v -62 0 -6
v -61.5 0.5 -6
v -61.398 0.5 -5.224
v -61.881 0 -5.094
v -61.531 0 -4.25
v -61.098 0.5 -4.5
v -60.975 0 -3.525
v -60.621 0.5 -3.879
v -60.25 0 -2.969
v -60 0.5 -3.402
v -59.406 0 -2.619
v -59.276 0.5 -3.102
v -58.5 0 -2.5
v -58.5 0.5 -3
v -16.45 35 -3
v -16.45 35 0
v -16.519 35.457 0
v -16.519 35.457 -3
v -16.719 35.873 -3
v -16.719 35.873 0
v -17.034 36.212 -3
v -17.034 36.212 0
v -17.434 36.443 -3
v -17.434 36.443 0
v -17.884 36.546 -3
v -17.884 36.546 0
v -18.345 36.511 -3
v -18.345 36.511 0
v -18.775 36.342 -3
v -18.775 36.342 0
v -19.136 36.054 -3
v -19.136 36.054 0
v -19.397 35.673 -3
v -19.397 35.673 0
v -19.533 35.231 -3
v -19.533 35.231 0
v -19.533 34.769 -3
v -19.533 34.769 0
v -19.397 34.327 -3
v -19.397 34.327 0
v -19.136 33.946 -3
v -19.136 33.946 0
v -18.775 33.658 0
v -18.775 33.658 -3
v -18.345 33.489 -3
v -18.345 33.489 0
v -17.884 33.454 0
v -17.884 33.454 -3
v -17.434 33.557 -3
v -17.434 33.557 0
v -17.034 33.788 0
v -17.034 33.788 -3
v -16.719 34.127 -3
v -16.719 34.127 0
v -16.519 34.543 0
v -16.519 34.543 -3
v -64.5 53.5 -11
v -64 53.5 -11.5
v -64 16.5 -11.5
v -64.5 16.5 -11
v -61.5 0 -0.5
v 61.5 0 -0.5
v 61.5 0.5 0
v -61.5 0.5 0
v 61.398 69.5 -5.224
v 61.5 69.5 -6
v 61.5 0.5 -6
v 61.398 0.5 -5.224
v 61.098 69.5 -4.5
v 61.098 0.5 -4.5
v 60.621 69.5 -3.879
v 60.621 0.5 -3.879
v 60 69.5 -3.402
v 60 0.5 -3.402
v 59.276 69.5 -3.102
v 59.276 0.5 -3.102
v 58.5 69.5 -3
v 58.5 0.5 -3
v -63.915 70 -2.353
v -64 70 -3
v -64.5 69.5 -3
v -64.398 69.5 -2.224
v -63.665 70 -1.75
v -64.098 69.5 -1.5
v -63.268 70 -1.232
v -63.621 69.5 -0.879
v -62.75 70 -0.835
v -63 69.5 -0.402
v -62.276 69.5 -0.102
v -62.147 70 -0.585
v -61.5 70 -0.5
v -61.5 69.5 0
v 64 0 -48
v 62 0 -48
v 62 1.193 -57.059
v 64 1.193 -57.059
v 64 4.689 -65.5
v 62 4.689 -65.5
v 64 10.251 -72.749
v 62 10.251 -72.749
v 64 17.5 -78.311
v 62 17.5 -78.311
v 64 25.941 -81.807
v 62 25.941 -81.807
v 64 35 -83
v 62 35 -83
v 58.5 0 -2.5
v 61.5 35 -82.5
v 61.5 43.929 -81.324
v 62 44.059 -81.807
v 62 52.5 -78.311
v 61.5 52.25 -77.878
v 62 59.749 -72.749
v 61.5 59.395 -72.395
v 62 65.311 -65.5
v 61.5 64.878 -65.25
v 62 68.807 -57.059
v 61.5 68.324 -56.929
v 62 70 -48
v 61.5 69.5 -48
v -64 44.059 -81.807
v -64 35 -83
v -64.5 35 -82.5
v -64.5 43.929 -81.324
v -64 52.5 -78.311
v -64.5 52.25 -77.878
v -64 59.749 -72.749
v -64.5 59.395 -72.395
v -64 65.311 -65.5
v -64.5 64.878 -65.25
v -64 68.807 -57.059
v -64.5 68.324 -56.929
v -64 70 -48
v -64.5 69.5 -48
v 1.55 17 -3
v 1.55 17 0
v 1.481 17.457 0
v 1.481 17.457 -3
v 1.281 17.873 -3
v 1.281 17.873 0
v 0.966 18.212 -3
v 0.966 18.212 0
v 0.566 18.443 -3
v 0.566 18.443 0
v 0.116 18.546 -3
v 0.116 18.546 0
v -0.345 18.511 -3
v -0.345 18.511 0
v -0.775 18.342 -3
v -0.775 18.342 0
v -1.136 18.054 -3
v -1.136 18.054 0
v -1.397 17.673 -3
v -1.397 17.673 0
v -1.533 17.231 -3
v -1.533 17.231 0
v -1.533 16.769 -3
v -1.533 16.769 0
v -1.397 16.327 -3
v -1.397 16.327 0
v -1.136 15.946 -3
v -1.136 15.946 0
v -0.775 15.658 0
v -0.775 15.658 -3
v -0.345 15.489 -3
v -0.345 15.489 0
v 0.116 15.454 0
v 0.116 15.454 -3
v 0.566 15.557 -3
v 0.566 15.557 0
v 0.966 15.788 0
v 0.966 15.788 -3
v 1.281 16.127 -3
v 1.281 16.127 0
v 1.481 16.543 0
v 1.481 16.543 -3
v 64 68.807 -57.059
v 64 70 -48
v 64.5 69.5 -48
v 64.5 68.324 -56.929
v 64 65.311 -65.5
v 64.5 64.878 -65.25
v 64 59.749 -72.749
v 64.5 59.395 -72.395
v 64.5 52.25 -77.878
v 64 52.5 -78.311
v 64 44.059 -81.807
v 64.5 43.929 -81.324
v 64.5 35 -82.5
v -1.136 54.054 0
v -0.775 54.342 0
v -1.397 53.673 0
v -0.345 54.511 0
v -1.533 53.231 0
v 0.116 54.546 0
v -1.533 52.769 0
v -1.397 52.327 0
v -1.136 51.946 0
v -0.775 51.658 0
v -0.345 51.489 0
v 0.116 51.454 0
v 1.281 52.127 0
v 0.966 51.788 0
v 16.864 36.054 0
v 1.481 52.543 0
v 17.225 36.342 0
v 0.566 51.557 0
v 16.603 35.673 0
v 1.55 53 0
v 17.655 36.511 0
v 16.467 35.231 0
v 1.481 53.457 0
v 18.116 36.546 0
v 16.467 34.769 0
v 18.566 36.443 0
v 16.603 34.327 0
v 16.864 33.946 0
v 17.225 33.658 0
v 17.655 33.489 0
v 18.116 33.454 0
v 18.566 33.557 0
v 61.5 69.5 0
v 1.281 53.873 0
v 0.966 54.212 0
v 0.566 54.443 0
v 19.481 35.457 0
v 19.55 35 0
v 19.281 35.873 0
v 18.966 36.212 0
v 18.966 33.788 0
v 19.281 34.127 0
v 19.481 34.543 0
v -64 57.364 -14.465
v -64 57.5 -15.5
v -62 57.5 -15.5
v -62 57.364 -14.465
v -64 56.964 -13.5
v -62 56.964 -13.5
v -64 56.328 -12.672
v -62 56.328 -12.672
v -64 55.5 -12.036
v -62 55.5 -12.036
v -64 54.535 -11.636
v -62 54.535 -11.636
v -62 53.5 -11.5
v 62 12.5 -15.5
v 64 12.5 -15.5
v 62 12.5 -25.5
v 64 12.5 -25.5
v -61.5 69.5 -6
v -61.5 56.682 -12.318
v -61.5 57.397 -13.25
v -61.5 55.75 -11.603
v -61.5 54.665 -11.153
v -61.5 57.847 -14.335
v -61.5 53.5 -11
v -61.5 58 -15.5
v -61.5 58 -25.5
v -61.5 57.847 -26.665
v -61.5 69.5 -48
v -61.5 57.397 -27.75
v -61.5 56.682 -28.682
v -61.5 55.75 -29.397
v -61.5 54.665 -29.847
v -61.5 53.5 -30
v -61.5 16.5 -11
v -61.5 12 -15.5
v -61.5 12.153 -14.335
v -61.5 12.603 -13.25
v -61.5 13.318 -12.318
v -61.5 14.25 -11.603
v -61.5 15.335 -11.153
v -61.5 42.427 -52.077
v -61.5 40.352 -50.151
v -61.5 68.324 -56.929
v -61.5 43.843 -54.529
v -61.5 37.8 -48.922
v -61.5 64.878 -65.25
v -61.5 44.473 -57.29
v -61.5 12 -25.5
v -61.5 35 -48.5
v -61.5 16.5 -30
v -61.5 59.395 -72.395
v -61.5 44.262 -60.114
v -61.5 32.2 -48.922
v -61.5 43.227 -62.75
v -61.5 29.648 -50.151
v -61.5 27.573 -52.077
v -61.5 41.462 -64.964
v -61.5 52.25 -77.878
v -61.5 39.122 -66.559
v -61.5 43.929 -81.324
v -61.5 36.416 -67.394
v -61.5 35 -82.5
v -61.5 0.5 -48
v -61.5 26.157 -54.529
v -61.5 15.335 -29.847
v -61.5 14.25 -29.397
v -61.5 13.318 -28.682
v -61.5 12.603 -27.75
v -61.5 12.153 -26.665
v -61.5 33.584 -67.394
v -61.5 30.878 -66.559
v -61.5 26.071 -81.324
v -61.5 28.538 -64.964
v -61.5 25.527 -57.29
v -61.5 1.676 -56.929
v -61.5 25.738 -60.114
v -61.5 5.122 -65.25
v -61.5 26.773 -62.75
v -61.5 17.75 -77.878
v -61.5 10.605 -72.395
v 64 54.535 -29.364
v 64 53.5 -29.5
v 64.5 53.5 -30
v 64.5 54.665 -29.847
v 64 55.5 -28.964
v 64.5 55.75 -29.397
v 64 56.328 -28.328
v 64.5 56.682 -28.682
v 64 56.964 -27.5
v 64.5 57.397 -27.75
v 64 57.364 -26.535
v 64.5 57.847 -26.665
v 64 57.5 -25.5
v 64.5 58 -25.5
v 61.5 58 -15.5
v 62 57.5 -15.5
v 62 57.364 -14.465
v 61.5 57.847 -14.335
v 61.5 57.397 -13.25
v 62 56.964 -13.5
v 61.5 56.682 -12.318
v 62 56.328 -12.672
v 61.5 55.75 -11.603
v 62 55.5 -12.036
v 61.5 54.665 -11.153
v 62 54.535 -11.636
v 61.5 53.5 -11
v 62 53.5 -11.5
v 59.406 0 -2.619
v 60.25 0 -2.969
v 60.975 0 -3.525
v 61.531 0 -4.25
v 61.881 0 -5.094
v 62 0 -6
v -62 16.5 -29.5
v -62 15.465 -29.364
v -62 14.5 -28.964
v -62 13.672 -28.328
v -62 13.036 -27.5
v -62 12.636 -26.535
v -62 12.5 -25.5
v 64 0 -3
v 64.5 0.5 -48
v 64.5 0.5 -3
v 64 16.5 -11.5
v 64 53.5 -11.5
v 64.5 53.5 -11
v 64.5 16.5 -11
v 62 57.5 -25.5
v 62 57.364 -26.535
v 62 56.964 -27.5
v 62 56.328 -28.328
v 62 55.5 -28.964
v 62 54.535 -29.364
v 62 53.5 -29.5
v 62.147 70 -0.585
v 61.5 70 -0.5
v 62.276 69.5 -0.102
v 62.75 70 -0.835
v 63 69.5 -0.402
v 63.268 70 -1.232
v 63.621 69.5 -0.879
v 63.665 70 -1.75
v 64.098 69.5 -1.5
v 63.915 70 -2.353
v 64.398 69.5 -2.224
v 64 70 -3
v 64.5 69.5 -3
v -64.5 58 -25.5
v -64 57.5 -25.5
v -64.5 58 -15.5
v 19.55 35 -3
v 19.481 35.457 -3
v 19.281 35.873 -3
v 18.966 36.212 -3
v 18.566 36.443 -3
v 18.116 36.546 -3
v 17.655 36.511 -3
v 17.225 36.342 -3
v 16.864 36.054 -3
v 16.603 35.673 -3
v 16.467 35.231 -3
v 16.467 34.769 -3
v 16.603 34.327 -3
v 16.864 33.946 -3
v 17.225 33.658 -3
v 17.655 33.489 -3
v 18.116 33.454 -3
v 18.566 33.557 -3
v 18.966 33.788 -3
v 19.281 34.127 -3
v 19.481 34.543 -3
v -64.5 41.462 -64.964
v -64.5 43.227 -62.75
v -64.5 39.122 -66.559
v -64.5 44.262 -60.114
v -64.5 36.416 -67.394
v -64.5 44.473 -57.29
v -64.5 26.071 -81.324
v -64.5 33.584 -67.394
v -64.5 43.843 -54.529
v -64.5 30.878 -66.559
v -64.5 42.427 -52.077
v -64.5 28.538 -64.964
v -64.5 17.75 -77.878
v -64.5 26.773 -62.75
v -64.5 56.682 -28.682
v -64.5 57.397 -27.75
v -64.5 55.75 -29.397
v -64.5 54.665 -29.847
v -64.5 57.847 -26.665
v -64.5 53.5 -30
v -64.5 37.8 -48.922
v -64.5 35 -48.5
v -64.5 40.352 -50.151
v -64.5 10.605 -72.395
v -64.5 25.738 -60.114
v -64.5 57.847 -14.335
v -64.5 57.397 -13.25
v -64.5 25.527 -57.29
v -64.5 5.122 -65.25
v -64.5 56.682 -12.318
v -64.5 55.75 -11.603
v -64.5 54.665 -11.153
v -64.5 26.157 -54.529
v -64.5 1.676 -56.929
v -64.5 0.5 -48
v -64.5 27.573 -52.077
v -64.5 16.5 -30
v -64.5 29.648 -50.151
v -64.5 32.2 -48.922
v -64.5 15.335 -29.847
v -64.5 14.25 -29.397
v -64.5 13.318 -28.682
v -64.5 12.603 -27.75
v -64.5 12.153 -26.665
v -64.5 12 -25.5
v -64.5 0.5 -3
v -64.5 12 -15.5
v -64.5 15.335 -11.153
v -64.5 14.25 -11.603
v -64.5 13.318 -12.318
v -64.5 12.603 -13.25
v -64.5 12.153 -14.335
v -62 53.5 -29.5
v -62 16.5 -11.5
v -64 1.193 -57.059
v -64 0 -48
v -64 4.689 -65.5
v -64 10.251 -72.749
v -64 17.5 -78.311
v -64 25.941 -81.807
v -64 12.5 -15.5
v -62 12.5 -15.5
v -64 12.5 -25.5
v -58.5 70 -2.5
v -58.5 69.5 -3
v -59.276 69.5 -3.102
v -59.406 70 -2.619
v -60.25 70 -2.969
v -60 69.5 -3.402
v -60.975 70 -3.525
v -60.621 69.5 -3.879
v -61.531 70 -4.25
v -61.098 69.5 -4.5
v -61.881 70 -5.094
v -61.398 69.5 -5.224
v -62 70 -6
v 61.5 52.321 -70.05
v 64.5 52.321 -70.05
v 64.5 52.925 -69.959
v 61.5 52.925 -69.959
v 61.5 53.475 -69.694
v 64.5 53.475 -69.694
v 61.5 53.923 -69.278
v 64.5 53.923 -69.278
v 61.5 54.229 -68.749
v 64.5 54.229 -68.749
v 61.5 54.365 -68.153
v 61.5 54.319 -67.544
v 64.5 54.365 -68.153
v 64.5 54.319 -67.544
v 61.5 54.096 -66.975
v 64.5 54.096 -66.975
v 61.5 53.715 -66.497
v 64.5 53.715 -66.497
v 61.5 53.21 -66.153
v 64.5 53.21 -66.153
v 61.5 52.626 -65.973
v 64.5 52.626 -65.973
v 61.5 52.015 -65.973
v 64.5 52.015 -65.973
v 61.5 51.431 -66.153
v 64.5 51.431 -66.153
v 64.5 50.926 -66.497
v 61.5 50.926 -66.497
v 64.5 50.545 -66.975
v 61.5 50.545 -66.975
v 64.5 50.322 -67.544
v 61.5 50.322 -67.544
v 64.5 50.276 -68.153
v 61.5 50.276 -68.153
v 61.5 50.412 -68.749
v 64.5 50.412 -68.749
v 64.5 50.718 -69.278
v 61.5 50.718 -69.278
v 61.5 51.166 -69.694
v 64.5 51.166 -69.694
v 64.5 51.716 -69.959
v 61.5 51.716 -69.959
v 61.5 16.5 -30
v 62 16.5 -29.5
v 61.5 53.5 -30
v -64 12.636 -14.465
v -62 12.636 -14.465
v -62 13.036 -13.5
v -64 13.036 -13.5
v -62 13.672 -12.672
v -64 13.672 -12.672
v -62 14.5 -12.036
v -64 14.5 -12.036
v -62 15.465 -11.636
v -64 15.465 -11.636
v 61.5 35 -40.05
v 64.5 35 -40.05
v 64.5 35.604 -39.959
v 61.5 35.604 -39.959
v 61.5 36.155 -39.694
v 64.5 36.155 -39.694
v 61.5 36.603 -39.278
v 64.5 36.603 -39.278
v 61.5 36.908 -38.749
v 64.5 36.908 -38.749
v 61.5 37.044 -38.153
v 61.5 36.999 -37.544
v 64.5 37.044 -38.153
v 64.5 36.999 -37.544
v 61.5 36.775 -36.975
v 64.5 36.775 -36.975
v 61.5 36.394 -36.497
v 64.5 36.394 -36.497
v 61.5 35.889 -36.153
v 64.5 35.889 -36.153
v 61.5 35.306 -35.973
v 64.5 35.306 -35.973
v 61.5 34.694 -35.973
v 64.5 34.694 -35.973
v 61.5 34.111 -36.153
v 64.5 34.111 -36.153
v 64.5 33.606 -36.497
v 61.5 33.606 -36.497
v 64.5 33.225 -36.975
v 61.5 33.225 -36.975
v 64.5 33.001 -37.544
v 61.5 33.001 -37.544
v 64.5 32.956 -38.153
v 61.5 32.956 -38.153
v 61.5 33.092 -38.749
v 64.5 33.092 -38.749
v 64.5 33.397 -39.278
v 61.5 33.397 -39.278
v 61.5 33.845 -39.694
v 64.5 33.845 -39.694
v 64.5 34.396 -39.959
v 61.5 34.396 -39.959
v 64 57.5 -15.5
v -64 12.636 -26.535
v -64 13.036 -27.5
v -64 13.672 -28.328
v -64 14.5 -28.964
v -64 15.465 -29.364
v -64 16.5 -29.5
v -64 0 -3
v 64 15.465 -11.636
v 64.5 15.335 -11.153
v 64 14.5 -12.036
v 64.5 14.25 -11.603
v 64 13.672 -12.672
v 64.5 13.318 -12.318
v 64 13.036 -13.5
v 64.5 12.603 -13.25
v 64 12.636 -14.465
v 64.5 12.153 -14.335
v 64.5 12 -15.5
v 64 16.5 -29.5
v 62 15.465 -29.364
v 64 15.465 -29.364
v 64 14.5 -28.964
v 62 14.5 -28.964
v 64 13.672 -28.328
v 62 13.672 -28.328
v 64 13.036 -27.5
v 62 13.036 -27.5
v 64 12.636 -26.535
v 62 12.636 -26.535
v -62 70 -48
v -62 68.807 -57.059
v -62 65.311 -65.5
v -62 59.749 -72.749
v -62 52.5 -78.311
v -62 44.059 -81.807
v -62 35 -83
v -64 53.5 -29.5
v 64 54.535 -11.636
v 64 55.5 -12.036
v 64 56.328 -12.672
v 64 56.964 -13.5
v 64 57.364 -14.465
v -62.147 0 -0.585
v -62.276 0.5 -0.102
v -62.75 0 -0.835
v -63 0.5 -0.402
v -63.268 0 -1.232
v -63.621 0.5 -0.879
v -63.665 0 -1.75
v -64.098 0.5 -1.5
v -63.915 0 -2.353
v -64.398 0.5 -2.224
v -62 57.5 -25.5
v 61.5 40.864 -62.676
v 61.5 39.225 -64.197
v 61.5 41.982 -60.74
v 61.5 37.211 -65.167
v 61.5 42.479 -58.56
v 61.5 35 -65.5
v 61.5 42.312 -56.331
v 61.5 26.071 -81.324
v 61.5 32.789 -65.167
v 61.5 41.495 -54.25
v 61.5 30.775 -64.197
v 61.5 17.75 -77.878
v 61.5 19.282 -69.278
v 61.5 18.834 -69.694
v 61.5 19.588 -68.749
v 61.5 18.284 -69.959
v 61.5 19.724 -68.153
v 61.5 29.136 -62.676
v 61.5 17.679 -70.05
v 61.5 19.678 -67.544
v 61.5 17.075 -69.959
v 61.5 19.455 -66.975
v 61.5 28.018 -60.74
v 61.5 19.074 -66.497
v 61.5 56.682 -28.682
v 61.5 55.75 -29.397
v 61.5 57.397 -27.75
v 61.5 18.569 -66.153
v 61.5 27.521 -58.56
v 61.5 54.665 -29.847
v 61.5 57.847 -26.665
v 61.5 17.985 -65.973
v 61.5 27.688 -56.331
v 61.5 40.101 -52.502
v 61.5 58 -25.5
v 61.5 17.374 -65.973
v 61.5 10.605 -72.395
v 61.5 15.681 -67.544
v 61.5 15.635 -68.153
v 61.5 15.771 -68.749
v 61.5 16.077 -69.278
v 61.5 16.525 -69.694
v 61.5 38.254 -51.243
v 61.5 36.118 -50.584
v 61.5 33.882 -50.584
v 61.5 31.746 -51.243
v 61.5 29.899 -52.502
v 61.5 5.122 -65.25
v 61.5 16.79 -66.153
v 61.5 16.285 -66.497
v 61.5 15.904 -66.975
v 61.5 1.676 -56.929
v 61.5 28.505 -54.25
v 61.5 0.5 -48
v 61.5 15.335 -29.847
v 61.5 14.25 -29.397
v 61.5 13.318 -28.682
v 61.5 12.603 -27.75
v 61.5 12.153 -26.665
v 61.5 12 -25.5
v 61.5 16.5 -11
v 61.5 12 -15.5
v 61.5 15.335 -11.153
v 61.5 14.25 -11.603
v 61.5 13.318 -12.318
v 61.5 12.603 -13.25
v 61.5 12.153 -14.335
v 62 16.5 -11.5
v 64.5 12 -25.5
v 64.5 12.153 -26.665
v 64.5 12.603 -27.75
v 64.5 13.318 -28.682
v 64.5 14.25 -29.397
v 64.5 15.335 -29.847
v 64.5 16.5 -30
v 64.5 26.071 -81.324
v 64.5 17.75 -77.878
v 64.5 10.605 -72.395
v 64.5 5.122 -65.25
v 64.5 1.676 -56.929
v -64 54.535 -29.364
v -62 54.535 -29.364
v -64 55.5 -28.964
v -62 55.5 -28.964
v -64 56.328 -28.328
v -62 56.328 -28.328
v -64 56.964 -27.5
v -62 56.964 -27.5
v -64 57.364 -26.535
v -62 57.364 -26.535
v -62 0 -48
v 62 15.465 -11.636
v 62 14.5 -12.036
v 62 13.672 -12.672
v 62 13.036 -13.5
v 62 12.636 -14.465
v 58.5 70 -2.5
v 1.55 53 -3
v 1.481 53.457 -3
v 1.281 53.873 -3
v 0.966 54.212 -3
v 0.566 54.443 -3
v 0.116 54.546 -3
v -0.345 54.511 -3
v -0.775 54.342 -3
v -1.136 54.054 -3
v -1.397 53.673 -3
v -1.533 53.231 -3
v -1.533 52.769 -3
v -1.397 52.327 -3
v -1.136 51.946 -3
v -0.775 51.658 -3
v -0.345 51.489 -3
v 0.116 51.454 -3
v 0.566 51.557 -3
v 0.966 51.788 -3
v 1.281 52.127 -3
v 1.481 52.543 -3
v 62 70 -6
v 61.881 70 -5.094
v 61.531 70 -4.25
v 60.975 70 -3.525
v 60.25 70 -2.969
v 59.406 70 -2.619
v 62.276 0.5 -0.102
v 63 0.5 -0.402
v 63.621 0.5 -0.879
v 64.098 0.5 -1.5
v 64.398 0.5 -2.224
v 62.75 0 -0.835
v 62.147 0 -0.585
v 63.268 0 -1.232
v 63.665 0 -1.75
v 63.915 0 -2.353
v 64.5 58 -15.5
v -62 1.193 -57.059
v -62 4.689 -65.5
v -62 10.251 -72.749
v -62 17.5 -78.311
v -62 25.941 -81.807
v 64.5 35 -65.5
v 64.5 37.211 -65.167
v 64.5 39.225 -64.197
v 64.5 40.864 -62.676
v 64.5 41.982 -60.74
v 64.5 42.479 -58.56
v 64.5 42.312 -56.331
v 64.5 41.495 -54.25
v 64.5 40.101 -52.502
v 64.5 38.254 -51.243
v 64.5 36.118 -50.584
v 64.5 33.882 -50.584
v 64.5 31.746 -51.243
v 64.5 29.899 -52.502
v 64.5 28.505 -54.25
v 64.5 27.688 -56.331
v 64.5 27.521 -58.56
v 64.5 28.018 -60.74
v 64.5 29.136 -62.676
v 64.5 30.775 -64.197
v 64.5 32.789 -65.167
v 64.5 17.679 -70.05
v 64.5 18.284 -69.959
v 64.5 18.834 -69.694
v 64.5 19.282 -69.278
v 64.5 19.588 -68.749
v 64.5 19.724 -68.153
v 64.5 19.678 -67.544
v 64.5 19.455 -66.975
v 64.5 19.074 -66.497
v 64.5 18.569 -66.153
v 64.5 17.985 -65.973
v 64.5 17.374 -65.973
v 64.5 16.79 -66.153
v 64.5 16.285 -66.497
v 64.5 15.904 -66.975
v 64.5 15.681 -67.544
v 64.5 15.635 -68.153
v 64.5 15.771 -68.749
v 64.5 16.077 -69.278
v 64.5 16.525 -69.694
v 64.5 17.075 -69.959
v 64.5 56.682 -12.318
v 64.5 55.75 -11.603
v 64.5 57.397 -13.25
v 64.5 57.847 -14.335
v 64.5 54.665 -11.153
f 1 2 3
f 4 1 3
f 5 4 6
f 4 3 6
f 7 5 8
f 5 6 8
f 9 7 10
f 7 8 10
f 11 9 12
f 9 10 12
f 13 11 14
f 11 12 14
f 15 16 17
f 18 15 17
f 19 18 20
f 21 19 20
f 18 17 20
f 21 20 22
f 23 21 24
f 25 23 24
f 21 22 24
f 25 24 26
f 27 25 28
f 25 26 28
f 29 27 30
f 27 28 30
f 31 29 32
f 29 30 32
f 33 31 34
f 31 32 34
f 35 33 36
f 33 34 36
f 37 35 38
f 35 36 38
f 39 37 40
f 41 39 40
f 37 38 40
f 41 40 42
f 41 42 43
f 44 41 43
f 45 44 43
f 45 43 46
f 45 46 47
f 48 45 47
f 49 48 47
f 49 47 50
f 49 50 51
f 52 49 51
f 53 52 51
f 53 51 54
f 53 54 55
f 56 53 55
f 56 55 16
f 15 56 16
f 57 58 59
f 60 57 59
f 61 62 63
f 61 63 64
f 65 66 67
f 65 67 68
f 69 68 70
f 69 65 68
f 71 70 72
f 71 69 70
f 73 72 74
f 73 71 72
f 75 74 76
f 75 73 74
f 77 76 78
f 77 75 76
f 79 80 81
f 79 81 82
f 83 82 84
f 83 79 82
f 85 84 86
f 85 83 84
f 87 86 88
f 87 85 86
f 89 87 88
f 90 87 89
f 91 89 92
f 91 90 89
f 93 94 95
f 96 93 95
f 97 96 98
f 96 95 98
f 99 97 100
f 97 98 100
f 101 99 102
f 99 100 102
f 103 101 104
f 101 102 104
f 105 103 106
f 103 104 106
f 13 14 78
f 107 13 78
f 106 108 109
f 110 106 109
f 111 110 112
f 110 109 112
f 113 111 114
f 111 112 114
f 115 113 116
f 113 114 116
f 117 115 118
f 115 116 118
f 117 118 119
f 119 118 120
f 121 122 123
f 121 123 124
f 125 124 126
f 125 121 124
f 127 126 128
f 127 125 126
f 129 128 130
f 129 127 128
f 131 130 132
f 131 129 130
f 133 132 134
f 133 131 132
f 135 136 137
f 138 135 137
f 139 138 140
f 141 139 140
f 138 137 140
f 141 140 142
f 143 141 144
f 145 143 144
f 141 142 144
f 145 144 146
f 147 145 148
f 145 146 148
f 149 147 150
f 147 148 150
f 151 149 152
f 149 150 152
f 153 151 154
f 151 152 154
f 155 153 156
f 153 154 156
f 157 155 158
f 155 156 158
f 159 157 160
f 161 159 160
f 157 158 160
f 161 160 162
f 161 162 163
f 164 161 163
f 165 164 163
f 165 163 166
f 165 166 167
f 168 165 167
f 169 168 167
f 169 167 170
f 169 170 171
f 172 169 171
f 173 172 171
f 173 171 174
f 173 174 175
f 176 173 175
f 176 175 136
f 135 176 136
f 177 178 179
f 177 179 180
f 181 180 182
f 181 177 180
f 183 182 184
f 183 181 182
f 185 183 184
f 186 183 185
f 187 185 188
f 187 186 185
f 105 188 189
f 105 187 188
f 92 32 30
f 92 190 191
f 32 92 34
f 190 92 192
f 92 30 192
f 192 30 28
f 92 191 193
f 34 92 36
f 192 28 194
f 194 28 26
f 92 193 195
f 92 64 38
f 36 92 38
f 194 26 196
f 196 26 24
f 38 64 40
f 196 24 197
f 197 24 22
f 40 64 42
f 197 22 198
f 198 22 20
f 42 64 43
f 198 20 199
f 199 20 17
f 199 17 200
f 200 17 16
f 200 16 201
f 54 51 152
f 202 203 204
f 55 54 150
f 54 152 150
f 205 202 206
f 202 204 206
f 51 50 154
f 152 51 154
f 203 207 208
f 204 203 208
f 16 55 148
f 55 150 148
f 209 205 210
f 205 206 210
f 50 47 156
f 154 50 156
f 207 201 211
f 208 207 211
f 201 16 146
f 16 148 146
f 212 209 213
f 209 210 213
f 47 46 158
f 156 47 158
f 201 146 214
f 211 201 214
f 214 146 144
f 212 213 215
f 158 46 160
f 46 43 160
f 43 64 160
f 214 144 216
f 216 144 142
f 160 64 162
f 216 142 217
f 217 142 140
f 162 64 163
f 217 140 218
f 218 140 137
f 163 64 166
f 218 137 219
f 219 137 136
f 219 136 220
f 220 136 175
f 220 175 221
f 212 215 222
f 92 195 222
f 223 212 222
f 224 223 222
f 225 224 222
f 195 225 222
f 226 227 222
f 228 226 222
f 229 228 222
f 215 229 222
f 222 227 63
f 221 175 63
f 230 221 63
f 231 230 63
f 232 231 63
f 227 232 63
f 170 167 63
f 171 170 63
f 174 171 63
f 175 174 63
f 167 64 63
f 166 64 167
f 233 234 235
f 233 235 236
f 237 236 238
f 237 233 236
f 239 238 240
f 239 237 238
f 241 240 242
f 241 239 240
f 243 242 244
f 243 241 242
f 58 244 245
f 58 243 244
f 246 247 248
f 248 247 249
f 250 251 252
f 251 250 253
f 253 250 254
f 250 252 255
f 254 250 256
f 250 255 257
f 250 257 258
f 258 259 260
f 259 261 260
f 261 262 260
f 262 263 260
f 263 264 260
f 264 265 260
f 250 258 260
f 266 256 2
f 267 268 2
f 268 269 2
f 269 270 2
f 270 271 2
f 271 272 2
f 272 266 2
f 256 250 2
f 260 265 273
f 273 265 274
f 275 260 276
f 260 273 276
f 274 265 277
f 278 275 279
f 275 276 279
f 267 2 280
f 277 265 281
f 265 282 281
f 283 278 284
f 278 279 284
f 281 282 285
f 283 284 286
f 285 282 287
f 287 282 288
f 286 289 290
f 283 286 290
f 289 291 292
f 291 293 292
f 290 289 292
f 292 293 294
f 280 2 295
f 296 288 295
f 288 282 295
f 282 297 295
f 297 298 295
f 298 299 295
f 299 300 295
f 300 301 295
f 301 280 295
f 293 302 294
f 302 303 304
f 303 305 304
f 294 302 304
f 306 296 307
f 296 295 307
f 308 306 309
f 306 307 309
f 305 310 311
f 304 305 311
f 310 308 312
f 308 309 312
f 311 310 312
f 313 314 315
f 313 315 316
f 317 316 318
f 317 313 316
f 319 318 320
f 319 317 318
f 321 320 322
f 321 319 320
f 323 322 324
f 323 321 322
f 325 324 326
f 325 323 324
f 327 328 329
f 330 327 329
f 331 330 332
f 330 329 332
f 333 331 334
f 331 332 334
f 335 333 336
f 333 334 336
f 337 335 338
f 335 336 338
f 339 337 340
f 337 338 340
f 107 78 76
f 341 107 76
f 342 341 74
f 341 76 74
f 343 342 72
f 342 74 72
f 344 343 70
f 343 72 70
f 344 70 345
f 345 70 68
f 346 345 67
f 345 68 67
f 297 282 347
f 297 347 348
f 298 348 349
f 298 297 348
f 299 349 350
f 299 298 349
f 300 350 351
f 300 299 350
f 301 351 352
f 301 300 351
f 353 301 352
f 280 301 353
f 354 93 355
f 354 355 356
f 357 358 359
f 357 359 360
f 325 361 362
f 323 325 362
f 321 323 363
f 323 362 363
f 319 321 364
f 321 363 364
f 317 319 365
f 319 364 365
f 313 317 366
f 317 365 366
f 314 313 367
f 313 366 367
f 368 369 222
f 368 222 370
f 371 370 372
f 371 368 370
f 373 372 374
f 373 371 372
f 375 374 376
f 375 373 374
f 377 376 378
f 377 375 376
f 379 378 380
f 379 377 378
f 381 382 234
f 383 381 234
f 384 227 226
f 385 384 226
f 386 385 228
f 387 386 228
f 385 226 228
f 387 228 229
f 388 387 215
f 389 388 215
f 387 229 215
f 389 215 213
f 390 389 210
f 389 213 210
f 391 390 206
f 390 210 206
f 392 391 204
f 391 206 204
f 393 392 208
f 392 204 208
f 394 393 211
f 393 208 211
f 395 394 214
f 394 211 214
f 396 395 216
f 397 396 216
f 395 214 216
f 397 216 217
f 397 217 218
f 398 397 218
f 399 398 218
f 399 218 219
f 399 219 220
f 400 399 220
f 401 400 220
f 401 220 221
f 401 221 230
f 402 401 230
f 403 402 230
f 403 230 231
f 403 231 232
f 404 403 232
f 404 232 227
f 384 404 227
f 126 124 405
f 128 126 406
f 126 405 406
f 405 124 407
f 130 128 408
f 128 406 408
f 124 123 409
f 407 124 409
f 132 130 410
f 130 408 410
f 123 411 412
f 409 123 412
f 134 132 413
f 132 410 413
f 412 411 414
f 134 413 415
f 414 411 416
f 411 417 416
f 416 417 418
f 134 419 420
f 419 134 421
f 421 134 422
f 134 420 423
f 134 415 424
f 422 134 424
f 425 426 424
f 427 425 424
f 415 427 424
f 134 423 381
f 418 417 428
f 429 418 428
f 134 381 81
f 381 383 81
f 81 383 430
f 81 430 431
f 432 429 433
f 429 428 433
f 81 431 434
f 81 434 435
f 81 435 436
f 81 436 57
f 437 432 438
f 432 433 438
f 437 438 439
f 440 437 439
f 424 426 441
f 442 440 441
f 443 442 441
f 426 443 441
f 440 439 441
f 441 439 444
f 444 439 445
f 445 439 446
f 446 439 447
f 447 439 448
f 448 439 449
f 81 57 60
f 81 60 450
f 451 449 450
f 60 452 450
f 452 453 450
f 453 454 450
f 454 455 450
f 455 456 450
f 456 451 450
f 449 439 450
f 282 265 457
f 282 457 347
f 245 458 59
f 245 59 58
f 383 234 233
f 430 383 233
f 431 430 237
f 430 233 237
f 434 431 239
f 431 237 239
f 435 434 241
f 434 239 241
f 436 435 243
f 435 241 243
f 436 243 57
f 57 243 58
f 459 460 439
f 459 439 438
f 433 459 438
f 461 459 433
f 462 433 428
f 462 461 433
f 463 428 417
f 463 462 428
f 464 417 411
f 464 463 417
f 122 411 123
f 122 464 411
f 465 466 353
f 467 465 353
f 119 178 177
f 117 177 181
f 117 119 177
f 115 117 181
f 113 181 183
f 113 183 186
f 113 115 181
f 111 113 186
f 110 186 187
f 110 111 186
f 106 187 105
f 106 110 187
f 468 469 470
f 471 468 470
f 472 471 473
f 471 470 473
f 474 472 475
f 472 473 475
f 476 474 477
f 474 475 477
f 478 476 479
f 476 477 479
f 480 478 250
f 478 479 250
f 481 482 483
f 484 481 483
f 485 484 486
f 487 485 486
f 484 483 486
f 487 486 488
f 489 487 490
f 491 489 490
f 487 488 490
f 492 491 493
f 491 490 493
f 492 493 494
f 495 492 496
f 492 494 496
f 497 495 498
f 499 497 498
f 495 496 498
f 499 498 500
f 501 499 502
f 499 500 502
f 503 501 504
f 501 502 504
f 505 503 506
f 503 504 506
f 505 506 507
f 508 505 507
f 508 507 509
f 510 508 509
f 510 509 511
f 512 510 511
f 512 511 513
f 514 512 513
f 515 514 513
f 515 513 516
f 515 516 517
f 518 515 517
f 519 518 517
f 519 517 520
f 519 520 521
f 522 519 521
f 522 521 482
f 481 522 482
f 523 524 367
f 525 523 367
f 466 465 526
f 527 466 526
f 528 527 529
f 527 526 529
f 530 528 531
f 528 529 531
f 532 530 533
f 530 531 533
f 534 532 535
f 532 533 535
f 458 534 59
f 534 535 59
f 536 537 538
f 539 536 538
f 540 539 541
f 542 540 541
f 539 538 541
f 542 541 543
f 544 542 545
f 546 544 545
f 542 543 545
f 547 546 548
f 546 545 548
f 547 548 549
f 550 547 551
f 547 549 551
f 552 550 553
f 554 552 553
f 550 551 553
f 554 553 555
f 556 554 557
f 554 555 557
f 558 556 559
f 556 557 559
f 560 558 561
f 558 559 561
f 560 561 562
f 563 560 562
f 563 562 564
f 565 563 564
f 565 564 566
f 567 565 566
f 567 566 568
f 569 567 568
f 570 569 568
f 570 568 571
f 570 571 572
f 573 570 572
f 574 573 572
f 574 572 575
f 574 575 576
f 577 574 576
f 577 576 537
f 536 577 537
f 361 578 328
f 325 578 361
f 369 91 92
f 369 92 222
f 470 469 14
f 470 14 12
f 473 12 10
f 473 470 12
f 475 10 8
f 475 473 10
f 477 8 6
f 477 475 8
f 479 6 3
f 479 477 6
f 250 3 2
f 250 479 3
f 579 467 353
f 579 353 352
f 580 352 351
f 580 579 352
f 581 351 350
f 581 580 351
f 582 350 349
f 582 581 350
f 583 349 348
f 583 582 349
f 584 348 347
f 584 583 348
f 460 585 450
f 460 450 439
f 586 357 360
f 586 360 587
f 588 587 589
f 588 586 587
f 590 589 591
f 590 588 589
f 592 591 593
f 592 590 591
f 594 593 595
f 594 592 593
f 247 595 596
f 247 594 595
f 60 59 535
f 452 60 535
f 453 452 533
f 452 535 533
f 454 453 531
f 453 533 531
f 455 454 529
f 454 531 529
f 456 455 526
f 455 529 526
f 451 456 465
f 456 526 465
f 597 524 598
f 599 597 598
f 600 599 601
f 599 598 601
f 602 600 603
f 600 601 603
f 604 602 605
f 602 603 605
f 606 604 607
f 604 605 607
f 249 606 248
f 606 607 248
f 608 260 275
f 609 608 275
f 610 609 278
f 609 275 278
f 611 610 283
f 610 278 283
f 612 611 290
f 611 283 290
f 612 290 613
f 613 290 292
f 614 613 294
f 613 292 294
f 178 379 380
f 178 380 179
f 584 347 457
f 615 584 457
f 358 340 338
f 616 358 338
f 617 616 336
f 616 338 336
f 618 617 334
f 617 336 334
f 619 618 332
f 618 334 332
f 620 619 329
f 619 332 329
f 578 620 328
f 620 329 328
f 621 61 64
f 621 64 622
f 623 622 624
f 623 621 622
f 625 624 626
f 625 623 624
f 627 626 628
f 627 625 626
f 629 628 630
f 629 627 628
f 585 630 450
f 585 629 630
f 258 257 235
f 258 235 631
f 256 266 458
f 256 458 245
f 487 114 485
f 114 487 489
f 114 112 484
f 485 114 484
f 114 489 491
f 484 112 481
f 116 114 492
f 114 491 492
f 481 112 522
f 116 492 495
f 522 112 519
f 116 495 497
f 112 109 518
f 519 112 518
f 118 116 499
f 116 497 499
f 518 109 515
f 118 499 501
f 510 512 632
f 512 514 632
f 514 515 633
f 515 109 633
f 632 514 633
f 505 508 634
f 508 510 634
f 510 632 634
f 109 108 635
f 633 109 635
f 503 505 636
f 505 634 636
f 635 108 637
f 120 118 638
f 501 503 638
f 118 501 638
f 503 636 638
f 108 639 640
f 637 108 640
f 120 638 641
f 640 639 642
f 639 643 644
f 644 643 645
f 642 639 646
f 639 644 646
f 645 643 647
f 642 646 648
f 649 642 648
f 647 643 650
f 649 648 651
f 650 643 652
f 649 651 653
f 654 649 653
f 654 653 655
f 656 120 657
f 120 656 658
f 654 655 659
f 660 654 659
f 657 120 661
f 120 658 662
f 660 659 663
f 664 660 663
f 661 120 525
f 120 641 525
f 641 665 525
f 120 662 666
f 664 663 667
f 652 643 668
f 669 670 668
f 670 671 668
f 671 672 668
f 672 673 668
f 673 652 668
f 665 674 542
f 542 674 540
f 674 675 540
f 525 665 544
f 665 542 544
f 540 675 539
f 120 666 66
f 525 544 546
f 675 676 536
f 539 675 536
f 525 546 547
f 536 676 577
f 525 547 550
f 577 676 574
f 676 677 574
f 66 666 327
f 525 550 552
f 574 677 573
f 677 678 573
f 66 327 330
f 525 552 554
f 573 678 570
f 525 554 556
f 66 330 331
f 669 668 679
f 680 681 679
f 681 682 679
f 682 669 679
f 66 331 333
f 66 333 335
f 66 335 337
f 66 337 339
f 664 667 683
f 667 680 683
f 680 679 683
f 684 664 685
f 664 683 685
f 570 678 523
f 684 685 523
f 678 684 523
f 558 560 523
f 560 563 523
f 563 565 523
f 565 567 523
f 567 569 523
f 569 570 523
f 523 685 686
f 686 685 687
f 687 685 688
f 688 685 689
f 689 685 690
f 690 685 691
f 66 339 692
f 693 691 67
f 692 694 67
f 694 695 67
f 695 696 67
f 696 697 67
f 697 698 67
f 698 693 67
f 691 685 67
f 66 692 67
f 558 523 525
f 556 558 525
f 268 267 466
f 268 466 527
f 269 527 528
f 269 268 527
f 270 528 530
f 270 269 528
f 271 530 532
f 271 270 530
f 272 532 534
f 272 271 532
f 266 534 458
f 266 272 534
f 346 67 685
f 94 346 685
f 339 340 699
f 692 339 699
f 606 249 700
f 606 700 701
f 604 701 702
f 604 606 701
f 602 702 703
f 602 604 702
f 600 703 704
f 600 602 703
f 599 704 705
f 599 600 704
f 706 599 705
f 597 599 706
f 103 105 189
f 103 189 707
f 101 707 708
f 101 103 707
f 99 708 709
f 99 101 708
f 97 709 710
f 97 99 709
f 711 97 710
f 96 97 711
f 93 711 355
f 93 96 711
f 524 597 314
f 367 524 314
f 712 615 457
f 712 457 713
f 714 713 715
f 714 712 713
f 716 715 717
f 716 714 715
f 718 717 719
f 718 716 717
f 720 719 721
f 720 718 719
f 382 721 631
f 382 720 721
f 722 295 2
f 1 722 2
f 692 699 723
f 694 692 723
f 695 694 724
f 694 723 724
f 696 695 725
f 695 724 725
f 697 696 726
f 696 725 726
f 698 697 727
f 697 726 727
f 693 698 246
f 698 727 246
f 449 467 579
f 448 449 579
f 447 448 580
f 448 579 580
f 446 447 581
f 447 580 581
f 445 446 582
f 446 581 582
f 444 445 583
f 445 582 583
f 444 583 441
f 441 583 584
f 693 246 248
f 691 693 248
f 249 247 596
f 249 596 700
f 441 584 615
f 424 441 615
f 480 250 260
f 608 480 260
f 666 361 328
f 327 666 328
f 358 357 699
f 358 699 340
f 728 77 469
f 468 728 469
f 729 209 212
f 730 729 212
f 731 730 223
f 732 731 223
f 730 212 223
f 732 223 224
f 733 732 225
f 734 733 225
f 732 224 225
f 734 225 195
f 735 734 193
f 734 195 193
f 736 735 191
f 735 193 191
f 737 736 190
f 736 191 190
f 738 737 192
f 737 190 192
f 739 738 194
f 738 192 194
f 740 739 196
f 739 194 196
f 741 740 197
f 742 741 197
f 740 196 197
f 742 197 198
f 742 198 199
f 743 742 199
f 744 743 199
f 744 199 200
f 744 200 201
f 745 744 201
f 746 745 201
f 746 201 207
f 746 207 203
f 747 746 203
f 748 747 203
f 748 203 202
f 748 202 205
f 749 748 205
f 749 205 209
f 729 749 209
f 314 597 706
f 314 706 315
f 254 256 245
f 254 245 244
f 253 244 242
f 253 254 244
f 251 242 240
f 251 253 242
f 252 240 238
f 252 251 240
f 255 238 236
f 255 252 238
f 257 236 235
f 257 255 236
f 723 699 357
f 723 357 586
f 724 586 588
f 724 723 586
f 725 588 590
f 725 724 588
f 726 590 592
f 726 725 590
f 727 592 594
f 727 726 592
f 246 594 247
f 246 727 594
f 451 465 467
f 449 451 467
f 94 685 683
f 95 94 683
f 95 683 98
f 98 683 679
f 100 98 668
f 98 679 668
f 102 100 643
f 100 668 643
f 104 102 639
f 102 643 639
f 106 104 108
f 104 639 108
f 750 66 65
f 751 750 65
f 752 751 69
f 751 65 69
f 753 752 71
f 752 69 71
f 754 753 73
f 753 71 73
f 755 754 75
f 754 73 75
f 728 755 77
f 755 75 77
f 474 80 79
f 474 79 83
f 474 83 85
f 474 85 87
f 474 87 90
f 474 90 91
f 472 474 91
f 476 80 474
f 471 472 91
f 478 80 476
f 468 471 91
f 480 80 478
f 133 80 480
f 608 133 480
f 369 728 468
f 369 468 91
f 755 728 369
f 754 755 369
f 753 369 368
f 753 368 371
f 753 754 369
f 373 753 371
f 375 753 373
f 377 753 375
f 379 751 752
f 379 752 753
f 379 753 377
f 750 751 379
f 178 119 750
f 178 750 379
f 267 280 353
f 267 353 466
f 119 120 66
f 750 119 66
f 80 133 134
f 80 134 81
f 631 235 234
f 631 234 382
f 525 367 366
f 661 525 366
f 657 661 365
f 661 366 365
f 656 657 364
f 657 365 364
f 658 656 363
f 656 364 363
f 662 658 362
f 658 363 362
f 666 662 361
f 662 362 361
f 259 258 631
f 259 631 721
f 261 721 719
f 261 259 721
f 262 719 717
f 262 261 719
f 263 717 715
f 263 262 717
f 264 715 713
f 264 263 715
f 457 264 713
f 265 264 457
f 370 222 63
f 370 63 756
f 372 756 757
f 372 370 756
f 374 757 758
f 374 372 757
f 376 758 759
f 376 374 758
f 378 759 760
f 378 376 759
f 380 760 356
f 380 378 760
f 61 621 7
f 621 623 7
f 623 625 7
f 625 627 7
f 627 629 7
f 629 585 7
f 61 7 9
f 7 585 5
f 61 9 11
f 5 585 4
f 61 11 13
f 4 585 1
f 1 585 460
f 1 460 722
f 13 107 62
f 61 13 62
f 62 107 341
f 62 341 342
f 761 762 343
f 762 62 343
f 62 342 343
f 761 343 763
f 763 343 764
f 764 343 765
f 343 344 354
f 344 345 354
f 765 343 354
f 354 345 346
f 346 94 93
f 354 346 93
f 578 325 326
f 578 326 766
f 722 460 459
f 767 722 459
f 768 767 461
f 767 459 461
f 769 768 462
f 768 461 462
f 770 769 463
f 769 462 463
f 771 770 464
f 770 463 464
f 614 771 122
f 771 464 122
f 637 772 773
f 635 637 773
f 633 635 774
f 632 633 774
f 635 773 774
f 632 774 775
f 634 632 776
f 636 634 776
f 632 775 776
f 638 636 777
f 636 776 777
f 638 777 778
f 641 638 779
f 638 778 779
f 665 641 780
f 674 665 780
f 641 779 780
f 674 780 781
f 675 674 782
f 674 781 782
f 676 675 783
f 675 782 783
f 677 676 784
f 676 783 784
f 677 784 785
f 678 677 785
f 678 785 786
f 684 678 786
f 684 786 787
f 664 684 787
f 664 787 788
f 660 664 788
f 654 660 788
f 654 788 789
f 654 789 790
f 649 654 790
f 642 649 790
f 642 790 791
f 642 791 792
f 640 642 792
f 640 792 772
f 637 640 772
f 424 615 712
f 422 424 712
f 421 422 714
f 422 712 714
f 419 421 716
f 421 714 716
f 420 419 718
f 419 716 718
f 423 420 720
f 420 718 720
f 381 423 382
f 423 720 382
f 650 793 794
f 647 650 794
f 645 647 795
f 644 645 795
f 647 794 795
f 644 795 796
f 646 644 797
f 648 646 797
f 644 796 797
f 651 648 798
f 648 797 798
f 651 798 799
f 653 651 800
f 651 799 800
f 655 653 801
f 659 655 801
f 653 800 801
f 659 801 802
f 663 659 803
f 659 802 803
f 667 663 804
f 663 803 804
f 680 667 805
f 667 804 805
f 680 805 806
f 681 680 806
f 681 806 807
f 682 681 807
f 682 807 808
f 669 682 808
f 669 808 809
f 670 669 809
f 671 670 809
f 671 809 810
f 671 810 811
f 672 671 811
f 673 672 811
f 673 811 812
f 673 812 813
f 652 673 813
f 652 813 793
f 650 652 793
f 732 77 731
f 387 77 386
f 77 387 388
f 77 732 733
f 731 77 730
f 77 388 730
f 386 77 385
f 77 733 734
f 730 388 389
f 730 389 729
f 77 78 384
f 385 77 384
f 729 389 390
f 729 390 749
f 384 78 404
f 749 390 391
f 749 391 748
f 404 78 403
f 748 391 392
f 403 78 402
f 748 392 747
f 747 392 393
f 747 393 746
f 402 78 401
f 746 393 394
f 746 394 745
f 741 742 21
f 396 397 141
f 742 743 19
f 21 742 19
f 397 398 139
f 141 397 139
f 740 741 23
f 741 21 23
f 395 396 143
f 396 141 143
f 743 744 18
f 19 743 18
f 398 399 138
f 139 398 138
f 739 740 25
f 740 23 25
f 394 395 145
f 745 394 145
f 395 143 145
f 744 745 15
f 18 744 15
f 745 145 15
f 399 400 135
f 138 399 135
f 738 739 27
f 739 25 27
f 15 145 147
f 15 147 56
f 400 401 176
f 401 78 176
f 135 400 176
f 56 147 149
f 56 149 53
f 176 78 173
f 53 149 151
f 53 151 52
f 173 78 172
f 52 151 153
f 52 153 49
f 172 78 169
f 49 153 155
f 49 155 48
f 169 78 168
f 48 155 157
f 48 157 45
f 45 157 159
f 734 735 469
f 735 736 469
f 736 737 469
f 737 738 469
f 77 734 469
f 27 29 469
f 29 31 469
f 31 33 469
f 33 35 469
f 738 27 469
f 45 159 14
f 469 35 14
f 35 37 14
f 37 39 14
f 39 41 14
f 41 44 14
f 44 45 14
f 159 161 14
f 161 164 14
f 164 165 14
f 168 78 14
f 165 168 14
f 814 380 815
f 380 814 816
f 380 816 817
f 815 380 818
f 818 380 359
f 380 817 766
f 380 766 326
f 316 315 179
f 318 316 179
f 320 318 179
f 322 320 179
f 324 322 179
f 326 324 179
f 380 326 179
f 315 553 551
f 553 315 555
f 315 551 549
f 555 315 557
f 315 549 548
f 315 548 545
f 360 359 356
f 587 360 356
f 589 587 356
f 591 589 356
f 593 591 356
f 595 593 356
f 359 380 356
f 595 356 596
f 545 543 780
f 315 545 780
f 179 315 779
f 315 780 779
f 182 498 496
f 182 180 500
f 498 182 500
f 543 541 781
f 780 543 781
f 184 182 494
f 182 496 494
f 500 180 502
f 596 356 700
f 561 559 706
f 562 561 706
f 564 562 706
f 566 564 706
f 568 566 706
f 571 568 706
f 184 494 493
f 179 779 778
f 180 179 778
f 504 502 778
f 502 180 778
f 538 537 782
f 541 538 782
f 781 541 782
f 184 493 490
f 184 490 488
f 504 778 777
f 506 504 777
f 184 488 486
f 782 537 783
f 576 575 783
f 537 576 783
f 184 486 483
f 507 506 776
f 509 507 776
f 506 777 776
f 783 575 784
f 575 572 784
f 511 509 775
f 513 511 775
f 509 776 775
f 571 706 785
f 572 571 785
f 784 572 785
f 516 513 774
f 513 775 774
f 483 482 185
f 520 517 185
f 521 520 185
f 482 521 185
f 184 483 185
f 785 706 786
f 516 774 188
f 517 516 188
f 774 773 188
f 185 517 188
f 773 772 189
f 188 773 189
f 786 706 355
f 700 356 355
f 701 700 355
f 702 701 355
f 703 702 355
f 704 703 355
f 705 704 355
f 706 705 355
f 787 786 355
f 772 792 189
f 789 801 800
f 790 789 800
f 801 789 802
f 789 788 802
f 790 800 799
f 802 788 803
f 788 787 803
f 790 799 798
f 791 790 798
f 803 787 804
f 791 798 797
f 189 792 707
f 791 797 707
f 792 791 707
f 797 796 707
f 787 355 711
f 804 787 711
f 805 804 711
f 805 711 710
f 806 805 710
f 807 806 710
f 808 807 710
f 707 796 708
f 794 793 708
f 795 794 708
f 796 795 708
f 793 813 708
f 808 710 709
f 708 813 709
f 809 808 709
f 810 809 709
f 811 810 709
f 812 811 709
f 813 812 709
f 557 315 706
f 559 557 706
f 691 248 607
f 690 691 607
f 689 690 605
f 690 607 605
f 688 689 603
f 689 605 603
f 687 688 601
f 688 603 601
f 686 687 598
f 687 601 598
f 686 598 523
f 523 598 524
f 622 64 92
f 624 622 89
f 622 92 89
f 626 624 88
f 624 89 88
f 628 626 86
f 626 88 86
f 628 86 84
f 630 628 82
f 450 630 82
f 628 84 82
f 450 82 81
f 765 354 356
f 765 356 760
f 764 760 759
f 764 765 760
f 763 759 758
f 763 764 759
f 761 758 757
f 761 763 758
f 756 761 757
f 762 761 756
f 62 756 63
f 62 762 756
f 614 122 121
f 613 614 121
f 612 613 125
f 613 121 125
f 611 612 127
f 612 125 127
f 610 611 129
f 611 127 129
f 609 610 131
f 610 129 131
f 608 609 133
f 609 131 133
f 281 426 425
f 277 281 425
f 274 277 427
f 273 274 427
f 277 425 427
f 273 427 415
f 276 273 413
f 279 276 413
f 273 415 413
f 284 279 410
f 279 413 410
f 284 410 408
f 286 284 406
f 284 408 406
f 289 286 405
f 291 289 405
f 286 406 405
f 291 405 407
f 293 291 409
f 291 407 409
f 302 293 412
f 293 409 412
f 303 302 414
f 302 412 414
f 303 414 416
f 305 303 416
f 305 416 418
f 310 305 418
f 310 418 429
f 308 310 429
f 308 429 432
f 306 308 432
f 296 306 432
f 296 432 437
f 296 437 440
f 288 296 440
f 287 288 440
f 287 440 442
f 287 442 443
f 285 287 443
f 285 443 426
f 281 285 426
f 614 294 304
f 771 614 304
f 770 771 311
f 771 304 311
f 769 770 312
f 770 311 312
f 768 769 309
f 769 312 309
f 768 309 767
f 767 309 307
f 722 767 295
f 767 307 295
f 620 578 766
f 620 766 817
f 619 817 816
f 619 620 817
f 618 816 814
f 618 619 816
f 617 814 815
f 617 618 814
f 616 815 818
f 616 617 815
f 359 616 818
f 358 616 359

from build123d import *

# Parameters (mm, degrees)
F_70MM_DEPTH            = 70
FILLET_1_R              = 3
CUT_EXTRUDE_1_REACH     = 170.612
SKETCH_2_R              = 2.05
SKETCH_2_R_2            = 7.5
CUT_EXTRUDE_2_REACH     = 170.612
SKETCH_3_R              = 9.5
SKETCH_4_W              = 18
SKETCH_4_H              = 45
CUT_EXTRUDE_3_DEPTH     = 169.611980594
FILLET_2_R              = 4
FILLET_3_R              = 35
HOLE_WIZARD_3_1_3_1_1_D = 3.1
CHAMFER_1_SIZE          = 0.5


with BuildPart() as part:
    # 草图1 → 宽70mm (new body)
    with BuildSketch(Plane(origin=(0, 0, 0), x_dir=(1, 0, 0), z_dir=(0, 1, 0))):
        Polygon((-64.5, 0), (64.5, 0), (64.5, 83), (61.5, 83), (61.5, 3), (-61.5, 3), (-61.5, 83), (-64.5, 83), align=None)
    extrude(amount=F_70MM_DEPTH)

    # 圆角1
    fillet_1_edges = [part.edges().sort_by_distance(p)[0] for p in [
        (64.5, 35, 0),
        (-64.5, 35, 0),
        (-61.5, 35, -3),
        (61.5, 35, -3),
    ]]
    fillet(fillet_1_edges, radius=FILLET_1_R)

    # 草图2 → 切除-拉伸1 (cut, up to next)
    with BuildSketch(Plane(origin=(64.5, 0, 0), x_dir=(0, 0, -1), z_dir=(1, 0, 0)), mode=Mode.PRIVATE) as cut_extrude_1_sk1:
        with Locations((38, 35)):
            Circle(SKETCH_2_R)
    cut_extrude_1_tool1 = extrude(cut_extrude_1_sk1.sketch, amount=-CUT_EXTRUDE_1_REACH, mode=Mode.PRIVATE) & part.part
    # 草图2 → 切除-拉伸1 (cut, up to next)
    with BuildSketch(Plane(origin=(64.5, 0, 0), x_dir=(0, 0, -1), z_dir=(1, 0, 0)), mode=Mode.PRIVATE) as cut_extrude_1_sk2:
        with Locations((68, 52.320508076)):
            Circle(SKETCH_2_R)
    cut_extrude_1_tool2 = extrude(cut_extrude_1_sk2.sketch, amount=-CUT_EXTRUDE_1_REACH, mode=Mode.PRIVATE) & part.part
    # 草图2 → 切除-拉伸1 (cut, up to next)
    with BuildSketch(Plane(origin=(64.5, 0, 0), x_dir=(0, 0, -1), z_dir=(1, 0, 0)), mode=Mode.PRIVATE) as cut_extrude_1_sk3:
        with Locations((68, 17.679491924)):
            Circle(SKETCH_2_R)
    cut_extrude_1_tool3 = extrude(cut_extrude_1_sk3.sketch, amount=-CUT_EXTRUDE_1_REACH, mode=Mode.PRIVATE) & part.part
    # 草图2 → 切除-拉伸1 (cut, up to next)
    with BuildSketch(Plane(origin=(64.5, 0, 0), x_dir=(0, 0, -1), z_dir=(1, 0, 0)), mode=Mode.PRIVATE) as cut_extrude_1_sk4:
        with Locations((58, 35)):
            Circle(SKETCH_2_R_2)
    cut_extrude_1_tool4 = extrude(cut_extrude_1_sk4.sketch, amount=-CUT_EXTRUDE_1_REACH, mode=Mode.PRIVATE) & part.part
    add(cut_extrude_1_tool1.solids().sort_by_distance((64.5, 35, -38))[0], mode=Mode.SUBTRACT)
    add(cut_extrude_1_tool2.solids().sort_by_distance((64.5, 52.320508, -68))[0], mode=Mode.SUBTRACT)
    add(cut_extrude_1_tool3.solids().sort_by_distance((64.5, 17.679492, -68))[0], mode=Mode.SUBTRACT)
    add(cut_extrude_1_tool4.solids().sort_by_distance((64.5, 35, -58))[0], mode=Mode.SUBTRACT)

    # 草图3 → 切除-拉伸2 (cut, up to next)
    with BuildSketch(Plane.ZY.offset(64.5), mode=Mode.PRIVATE) as cut_extrude_2_sk1:
        with Locations((-58, 35)):
            Circle(SKETCH_3_R)
    cut_extrude_2_tool1 = extrude(cut_extrude_2_sk1.sketch, amount=-CUT_EXTRUDE_2_REACH, mode=Mode.PRIVATE) & part.part
    add(cut_extrude_2_tool1.solids().sort_by_distance((-64.5, 35, -58))[0], mode=Mode.SUBTRACT)

    # 草图4 → 切除-拉伸3 (cut, through all)
    with BuildSketch(Plane(origin=(64.5, 0, 0), x_dir=(0, 0, -1), z_dir=(1, 0, 0))):
        with Locations((20.5, 35)):
            Rectangle(SKETCH_4_W, SKETCH_4_H)
    extrude(amount=-CUT_EXTRUDE_3_DEPTH, mode=Mode.SUBTRACT)

    # 圆角2
    fillet_2_edges = [part.edges().sort_by_distance(p)[0] for p in [
        (63, 57.5, -29.5),
        (-63, 57.5, -29.5),
        (63, 12.5, -29.5),
        (-63, 12.5, -29.5),
        (63, 12.5, -11.5),
        (-63, 12.5, -11.5),
        (63, 57.5, -11.5),
        (-63, 57.5, -11.5),
    ]]
    fillet(fillet_2_edges, radius=FILLET_2_R)

    # 圆角3
    fillet_3_edges = [part.edges().sort_by_distance(p)[0] for p in [
        (63, 70, -83),
        (-63, 70, -83),
        (-63, 0, -83),
        (63, 0, -83),
    ]]
    fillet(fillet_3_edges, radius=FILLET_3_R - 0.0001)  # a hair under: the kernel refuses the full size

    # Ø3.1 (3.1) 直径孔1 (through all)
    with Locations(Plane(origin=(0, 53, -3), x_dir=(-1, 0, 0), z_dir=(0, 0, -1))):
        with Locations((0, 0), (-18, -18), (0, -36), (18, -18)):
            Hole(HOLE_WIZARD_3_1_3_1_1_D / 2)

    # 倒角1
    chamfer_1_edges = [part.edges().sort_by_distance(p)[0] for p in [
        (-64.5, 35, -29.5),
        (-61.5, 35, -29.5),
        (-64.5, 35, -11.5),
        (-61.5, 35, -11.5),
        (-64.5, 12.5, -20.5),
        (-61.5, 12.5, -20.5),
        (64.5, 35, -29.5),
        (61.5, 35, -29.5),
        (64.5, 12.5, -20.5),
        (61.5, 12.5, -20.5),
        (64.5, 57.5, -20.5),
        (61.5, 57.5, -20.5),
        (64.5, 35, -11.5),
        (61.5, 35, -11.5),
        (-61.5, 56.328427125, -28.328427125),
        (-64.5, 56.328427125, -28.328427125),
        (-61.5, 56.328427125, -12.671572875),
        (-64.5, 56.328427125, -12.671572875),
        (-61.5, 13.671572875, -28.328427125),
        (-64.5, 13.671572875, -28.328427125),
        (-61.5, 13.671572875, -12.671572875),
        (-64.5, 13.671572875, -12.671572875),
        (64.5, 13.671572875, -28.328427125),
        (61.5, 13.671572875, -28.328427125),
        (64.5, 56.328427125, -28.328427125),
        (61.5, 56.328427125, -28.328427125),
        (64.5, 13.671572875, -12.671572875),
        (61.5, 13.671572875, -12.671572875),
        (64.5, 56.328427125, -12.671572875),
        (61.5, 56.328427125, -12.671572875),
        (61.5, 70, -27.00005),
        (-64.5, 70, -25.50005),
        (61.5, 0, -27.00005),
        (61.5, 10.251233369, -72.748766631),
        (61.5, 59.748766631, -72.748766631),
        (64.5, 10.251233369, -72.748766631),
        (64.5, 59.748766631, -72.748766631),
        (-64.5, 0, -25.50005),
        (-64.5, 10.251233369, -72.748766631),
        (-64.5, 59.748766631, -72.748766631),
        (-61.5, 10.251233369, -72.748766631),
        (-61.5, 59.748766631, -72.748766631),
        (64.5, 0, -25.50005),
        (64.5, 70, -25.50005),
        (0, 0, 0),
        (-61.5, 0, -27.00005),
        (0, 0, -3),
        (-63.621320344, 0, -0.878679656),
        (63.621320344, 0, -0.878679656),
        (0, 70, 0),
        (0, 70, -3),
        (-61.5, 70, -27.00005),
        (-63.621320344, 70, -0.878679656),
        (63.621320344, 70, -0.878679656),
        (-60.621320344, 0, -3.878679656),
        (-60.621320344, 70, -3.878679656),
        (60.621320344, 0, -3.878679656),
        (60.621320344, 70, -3.878679656),
        (-64.5, 57.5, -20.5),
        (-61.5, 57.5, -20.5),
    ]]
    chamfer(chamfer_1_edges, length=CHAMFER_1_SIZE)


solid = part.part
